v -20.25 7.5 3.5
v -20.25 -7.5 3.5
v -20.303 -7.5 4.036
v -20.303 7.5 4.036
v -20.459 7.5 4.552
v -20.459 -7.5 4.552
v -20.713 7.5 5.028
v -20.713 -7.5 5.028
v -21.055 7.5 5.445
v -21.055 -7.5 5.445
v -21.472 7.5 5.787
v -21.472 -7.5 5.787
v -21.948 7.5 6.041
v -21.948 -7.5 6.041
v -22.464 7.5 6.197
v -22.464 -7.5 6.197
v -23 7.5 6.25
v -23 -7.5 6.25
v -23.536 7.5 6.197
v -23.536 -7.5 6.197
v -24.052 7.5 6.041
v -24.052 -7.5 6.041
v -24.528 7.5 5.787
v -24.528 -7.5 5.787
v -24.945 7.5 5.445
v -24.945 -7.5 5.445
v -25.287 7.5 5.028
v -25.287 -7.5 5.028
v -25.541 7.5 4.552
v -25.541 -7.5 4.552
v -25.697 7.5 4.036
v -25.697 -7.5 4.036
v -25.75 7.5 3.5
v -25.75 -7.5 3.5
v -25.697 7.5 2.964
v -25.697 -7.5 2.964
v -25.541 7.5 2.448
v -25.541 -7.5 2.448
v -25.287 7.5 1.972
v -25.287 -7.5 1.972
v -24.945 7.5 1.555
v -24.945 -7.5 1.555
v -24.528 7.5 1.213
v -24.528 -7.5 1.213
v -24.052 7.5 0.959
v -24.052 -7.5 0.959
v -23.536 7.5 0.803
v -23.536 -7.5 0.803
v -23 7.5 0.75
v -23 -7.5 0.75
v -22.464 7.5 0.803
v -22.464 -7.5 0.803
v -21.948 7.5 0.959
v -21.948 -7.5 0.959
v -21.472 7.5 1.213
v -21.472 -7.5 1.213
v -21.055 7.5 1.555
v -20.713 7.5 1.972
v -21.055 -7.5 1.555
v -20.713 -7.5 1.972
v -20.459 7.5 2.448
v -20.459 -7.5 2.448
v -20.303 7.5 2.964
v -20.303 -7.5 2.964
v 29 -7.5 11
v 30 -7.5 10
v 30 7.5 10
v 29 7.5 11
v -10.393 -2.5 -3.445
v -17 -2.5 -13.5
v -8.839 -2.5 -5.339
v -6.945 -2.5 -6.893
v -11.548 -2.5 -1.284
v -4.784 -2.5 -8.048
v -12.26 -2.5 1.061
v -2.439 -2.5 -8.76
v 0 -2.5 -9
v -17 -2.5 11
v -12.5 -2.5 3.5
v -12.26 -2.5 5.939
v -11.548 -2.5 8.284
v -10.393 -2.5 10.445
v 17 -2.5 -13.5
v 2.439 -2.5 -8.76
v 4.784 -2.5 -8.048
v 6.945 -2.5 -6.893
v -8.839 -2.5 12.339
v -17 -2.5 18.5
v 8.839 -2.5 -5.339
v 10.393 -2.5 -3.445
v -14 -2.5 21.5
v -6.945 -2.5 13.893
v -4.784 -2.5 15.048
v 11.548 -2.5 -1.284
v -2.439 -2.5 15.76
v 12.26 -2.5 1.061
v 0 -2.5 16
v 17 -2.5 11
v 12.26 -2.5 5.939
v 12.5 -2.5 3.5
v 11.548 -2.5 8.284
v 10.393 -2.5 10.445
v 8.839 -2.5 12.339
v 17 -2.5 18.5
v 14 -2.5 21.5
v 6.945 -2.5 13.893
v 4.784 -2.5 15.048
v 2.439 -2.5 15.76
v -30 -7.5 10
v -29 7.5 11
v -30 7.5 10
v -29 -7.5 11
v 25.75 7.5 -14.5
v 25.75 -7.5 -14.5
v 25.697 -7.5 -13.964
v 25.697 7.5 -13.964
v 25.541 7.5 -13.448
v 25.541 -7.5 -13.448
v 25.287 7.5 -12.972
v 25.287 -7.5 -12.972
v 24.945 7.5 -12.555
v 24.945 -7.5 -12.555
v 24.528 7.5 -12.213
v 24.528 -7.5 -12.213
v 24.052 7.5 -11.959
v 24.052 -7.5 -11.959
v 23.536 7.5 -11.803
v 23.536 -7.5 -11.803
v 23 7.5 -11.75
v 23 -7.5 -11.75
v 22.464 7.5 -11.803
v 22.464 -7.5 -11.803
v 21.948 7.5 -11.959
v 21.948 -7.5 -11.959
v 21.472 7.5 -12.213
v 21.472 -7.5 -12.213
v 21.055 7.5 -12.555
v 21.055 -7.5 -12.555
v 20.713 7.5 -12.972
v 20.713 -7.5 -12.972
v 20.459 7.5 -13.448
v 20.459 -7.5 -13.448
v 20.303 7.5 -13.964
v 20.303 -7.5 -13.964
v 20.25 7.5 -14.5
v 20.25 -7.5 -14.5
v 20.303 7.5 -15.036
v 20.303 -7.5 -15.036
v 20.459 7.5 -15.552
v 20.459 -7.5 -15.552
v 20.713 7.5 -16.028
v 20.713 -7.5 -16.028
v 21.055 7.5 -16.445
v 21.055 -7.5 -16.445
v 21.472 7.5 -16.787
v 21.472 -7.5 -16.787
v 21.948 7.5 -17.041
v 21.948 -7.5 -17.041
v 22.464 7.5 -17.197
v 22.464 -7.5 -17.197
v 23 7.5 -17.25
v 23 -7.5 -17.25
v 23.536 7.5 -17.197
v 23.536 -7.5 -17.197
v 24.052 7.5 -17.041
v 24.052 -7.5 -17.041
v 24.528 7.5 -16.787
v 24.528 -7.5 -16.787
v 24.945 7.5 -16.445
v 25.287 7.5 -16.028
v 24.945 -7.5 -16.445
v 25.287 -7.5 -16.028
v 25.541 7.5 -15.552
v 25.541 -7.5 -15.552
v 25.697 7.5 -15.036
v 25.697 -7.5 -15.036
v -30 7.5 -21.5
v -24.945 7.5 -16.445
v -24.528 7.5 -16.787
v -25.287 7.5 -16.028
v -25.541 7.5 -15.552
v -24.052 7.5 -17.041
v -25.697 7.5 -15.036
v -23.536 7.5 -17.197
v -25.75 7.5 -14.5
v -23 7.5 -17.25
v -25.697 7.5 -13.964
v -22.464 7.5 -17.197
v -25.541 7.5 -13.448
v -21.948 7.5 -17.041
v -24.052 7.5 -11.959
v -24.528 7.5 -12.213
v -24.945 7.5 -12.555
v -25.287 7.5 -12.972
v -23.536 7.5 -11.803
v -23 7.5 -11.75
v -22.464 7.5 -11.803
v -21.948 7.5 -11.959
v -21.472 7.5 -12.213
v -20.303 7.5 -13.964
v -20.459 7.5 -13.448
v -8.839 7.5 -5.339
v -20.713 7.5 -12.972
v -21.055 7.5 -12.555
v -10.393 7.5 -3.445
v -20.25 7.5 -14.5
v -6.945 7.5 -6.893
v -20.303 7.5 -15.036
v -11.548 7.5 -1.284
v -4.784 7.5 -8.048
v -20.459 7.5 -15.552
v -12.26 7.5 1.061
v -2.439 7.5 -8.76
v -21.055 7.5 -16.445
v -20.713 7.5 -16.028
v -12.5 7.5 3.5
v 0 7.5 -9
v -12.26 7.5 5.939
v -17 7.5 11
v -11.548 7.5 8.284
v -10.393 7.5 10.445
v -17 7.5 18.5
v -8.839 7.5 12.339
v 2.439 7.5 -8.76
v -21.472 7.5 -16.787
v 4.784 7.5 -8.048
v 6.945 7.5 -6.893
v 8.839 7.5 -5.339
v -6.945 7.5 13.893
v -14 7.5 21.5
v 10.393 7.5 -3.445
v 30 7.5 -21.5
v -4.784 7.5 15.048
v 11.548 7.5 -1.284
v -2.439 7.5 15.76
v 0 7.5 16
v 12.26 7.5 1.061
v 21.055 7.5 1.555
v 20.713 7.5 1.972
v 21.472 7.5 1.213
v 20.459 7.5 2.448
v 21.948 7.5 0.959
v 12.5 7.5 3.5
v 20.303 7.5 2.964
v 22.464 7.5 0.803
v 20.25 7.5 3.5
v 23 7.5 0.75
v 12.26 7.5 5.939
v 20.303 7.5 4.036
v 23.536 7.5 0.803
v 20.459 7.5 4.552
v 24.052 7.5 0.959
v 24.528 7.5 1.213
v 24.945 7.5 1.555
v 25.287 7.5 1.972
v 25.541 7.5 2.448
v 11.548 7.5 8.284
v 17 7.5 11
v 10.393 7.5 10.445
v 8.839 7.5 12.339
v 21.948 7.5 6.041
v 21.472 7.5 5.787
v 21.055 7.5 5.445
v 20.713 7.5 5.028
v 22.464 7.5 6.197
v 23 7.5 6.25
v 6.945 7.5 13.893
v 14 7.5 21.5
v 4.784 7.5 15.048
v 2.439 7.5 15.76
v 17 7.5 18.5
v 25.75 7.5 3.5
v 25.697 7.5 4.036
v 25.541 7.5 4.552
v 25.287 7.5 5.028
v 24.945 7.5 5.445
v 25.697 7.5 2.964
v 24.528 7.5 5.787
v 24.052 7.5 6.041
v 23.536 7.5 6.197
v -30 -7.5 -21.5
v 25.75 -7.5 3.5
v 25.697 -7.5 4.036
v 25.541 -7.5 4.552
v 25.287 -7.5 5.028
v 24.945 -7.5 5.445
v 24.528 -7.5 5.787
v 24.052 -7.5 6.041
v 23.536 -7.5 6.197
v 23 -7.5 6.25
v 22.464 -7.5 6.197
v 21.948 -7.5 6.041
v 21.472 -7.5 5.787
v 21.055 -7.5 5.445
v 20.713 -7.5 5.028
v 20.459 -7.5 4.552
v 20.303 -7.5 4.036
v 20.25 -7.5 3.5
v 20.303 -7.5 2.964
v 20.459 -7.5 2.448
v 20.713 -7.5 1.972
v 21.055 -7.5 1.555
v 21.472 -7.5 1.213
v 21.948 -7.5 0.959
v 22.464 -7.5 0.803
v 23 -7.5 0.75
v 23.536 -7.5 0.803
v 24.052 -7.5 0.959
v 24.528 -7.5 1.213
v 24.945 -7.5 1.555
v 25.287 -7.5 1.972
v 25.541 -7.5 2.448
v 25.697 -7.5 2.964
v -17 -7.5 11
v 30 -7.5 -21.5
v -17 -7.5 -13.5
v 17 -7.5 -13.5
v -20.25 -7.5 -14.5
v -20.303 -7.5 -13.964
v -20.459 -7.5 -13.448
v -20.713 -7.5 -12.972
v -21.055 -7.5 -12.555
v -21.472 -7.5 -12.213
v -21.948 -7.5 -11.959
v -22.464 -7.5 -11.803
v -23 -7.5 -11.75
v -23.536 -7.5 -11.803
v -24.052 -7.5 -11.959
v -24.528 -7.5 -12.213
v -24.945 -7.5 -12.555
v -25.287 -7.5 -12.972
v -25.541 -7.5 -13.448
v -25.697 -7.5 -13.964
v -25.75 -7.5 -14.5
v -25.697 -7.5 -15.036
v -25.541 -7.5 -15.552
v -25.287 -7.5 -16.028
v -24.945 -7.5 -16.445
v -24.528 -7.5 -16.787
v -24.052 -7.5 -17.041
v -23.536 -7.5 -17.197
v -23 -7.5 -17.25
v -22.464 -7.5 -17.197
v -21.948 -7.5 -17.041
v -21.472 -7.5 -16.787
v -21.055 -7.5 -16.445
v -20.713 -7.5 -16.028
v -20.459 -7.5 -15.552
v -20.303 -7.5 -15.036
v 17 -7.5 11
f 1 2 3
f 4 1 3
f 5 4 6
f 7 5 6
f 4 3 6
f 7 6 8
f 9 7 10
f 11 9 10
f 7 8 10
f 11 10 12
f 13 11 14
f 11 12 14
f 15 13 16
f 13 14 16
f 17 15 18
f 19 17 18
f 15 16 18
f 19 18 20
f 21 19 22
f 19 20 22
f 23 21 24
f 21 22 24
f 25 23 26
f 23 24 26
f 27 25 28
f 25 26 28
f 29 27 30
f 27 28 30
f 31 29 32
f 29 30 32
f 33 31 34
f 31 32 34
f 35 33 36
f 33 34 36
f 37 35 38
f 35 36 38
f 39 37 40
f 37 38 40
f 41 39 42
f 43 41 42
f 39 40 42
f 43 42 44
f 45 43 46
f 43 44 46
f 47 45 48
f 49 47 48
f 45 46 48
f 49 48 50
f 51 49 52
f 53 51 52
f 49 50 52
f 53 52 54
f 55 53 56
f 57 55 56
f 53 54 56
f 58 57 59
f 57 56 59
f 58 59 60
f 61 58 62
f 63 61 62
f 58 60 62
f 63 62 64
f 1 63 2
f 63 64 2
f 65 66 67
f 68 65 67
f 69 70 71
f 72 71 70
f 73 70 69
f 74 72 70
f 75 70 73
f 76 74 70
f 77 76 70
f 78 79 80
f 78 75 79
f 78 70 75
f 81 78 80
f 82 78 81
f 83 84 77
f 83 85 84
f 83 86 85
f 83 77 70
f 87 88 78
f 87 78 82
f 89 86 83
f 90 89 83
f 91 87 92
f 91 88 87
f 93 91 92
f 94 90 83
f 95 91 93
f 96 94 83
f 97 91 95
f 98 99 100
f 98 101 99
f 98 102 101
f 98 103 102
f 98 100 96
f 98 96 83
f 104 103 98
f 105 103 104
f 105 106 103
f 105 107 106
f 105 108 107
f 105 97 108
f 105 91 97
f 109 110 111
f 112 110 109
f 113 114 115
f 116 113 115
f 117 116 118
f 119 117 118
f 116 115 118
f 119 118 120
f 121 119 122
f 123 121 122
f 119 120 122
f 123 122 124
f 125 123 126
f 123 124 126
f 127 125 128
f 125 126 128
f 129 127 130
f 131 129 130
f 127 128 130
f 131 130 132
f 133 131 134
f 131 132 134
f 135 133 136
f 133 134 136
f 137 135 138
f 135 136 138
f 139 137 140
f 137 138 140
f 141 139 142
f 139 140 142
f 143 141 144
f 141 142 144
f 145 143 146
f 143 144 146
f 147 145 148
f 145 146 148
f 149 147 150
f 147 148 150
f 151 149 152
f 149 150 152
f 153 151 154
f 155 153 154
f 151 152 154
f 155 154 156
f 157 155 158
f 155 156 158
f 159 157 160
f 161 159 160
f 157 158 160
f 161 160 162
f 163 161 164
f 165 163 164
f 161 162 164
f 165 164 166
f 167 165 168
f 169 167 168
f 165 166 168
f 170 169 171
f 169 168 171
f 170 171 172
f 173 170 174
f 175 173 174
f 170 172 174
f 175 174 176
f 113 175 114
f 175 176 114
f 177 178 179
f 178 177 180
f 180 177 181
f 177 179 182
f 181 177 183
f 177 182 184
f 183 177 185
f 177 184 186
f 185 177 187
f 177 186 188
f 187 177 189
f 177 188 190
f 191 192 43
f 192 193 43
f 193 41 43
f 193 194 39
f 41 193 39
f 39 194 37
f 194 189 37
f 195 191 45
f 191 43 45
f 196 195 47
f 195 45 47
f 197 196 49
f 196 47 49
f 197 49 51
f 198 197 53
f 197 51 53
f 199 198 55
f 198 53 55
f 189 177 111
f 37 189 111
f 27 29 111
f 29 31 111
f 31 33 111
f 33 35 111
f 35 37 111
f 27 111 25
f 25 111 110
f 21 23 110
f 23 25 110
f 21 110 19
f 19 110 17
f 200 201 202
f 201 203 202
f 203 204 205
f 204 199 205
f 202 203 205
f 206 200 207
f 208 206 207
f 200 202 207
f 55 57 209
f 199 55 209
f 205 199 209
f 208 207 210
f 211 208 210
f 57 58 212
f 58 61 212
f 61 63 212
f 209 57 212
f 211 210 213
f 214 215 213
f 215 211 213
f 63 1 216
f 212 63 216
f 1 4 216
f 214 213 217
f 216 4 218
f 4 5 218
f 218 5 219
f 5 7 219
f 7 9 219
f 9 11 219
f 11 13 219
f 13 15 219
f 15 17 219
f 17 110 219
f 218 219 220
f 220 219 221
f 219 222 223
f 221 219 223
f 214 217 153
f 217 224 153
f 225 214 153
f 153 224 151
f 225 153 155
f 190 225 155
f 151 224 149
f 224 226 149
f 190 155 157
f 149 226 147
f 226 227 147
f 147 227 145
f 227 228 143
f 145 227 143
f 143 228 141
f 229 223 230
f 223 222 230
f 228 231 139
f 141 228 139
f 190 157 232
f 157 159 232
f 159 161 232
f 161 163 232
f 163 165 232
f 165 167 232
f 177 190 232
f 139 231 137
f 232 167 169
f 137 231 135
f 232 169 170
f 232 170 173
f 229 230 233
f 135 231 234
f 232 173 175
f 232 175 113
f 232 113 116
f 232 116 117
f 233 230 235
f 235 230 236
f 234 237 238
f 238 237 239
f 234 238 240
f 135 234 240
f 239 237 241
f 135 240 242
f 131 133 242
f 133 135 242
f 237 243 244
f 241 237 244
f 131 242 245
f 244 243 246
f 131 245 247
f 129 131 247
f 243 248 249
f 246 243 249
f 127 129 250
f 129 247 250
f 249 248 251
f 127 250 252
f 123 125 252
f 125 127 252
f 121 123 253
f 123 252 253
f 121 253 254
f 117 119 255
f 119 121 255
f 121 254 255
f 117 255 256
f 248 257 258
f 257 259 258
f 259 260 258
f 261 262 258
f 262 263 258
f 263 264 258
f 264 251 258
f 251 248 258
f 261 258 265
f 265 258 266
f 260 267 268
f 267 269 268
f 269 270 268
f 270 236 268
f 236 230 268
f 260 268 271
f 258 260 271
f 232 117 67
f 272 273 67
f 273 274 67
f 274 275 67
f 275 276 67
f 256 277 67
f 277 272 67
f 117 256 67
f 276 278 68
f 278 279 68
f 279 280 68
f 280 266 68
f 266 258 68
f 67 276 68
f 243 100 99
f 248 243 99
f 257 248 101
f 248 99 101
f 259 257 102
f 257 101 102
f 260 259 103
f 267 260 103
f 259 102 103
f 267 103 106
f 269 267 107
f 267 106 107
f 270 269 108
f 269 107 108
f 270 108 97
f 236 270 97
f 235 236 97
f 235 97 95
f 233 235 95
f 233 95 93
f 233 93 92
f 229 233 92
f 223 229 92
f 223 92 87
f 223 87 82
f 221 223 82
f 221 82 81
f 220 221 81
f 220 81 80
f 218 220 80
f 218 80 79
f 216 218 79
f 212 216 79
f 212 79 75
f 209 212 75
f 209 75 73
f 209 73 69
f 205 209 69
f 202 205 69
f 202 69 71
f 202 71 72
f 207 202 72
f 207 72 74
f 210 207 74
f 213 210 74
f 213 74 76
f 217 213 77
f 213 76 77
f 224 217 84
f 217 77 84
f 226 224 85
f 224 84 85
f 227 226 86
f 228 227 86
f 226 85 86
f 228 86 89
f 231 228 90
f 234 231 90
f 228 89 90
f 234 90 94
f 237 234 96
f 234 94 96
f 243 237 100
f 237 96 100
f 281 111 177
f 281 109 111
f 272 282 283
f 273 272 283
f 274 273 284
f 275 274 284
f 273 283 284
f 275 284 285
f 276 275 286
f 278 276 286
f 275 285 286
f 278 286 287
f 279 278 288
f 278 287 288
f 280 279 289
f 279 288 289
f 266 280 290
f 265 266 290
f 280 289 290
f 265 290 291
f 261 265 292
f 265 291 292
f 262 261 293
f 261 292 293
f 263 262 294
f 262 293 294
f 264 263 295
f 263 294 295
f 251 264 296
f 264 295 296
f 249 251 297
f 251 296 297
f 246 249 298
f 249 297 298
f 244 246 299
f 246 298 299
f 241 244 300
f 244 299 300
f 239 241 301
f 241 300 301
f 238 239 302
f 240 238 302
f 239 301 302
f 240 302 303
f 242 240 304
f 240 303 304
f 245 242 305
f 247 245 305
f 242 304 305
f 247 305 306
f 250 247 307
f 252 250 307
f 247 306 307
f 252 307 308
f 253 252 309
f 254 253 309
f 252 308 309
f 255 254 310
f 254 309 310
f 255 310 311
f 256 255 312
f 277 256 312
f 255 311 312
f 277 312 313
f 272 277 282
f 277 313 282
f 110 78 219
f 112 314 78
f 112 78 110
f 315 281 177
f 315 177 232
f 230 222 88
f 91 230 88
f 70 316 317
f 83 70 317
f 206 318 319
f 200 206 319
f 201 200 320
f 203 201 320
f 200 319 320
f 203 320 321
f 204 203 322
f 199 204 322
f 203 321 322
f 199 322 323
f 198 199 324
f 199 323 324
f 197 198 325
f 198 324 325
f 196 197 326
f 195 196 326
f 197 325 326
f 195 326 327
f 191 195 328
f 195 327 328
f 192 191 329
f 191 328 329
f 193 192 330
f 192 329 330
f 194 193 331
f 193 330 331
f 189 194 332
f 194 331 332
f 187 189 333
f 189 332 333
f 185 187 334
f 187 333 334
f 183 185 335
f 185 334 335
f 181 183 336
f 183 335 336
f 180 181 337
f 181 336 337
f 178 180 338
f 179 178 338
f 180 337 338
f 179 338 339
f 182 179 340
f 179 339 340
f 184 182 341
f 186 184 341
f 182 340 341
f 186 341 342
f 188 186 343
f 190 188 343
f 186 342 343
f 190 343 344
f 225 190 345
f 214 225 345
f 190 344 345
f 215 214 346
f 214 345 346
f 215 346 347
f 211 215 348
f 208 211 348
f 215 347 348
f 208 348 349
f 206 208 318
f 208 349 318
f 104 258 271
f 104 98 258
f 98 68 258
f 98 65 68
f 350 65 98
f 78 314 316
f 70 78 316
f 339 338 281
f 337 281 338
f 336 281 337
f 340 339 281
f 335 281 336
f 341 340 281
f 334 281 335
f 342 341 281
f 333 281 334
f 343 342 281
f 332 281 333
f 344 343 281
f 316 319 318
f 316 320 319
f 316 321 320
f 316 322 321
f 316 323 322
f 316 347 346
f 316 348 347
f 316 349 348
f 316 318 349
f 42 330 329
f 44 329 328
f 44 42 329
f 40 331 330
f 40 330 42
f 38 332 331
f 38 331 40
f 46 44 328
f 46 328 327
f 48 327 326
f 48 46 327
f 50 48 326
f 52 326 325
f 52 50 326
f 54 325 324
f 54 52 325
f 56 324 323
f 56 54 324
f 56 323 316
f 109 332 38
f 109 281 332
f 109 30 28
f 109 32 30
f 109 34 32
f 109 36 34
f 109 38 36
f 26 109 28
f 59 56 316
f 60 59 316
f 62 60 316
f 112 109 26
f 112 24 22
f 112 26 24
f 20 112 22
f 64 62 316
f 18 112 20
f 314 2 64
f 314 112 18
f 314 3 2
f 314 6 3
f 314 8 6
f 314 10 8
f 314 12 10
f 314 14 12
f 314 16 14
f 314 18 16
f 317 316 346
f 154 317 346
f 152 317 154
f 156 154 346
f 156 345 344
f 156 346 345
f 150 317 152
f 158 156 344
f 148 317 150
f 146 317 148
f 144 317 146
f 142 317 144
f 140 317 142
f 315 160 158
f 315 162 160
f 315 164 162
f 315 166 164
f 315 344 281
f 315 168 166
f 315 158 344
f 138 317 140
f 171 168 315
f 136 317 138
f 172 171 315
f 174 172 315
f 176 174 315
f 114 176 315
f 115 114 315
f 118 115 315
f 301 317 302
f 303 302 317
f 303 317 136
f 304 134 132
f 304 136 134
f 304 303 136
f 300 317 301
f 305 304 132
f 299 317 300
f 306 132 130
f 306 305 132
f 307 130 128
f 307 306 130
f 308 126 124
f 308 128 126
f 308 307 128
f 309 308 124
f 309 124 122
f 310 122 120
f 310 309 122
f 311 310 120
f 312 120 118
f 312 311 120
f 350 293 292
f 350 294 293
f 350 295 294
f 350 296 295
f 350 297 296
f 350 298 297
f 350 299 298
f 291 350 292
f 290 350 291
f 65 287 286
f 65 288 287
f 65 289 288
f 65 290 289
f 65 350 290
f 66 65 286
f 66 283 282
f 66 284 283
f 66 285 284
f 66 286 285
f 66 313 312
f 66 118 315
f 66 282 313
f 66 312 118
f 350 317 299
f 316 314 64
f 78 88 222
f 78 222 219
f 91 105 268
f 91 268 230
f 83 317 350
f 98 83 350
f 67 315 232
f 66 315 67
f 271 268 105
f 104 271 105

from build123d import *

# Parameters (mm, degrees)
F1_DEPTH = 7.5
F2_R     = 12.5
F2_R_2   = 2.75
F3_DEPTH = 15
F4_SIZE  = 3
F5_SIZE  = 1
F6_W     = 31
F6_H     = 8.371188
F7_DEPTH = 5


with BuildPart() as f1:
    # F0 (on Front) → F1 (new body, symmetric)
    with BuildSketch(Plane.XZ):
        Polygon((17, 11), (17, 21.5), (-17, 21.5), (-17, 11), (-30, 11), (-30, -21.5), (30, -21.5), (30, 11), align=None)
    extrude(amount=F1_DEPTH, both=True)

    # F2 (on face) → F3 (cut)
    with BuildSketch(Plane.XZ.offset(7.5)):
        with Locations((0, 3.5)):
            Circle(F2_R)
        with Locations((-23, 3.5)):
            Circle(F2_R_2)
        with Locations((23, 3.5)):
            Circle(F2_R_2)
        with Locations((-23, -14.5)):
            Circle(F2_R_2)
        with Locations((23, -14.5)):
            Circle(F2_R_2)
    extrude(amount=-F3_DEPTH, mode=Mode.SUBTRACT)

    # F4
    f4_edges = [f1.edges().sort_by_distance(p)[0] for p in [
        (17, 0, 21.5),
        (-17, 0, 21.5),
    ]]
    chamfer(f4_edges, length=F4_SIZE)

    # F5
    f5_edges = [f1.edges().sort_by_distance(p)[0] for p in [
        (-30, 0, 11),
        (30, 0, 11),
    ]]
    chamfer(f5_edges, length=F5_SIZE)

    # F6 (on face) → F7 (cut)
    with BuildSketch(Plane.XZ.offset(7.5)):
        Polygon((17, -13.5), (17, 20.5), (15.5, 20.5), (-15.5, 20.5), (-17, 20.5), (-17, -13.5), align=None)
        with Locations((0, 24.685594)):
            Rectangle(F6_W, F6_H)
    extrude(amount=-F7_DEPTH, mode=Mode.SUBTRACT)


solid = f1.part
